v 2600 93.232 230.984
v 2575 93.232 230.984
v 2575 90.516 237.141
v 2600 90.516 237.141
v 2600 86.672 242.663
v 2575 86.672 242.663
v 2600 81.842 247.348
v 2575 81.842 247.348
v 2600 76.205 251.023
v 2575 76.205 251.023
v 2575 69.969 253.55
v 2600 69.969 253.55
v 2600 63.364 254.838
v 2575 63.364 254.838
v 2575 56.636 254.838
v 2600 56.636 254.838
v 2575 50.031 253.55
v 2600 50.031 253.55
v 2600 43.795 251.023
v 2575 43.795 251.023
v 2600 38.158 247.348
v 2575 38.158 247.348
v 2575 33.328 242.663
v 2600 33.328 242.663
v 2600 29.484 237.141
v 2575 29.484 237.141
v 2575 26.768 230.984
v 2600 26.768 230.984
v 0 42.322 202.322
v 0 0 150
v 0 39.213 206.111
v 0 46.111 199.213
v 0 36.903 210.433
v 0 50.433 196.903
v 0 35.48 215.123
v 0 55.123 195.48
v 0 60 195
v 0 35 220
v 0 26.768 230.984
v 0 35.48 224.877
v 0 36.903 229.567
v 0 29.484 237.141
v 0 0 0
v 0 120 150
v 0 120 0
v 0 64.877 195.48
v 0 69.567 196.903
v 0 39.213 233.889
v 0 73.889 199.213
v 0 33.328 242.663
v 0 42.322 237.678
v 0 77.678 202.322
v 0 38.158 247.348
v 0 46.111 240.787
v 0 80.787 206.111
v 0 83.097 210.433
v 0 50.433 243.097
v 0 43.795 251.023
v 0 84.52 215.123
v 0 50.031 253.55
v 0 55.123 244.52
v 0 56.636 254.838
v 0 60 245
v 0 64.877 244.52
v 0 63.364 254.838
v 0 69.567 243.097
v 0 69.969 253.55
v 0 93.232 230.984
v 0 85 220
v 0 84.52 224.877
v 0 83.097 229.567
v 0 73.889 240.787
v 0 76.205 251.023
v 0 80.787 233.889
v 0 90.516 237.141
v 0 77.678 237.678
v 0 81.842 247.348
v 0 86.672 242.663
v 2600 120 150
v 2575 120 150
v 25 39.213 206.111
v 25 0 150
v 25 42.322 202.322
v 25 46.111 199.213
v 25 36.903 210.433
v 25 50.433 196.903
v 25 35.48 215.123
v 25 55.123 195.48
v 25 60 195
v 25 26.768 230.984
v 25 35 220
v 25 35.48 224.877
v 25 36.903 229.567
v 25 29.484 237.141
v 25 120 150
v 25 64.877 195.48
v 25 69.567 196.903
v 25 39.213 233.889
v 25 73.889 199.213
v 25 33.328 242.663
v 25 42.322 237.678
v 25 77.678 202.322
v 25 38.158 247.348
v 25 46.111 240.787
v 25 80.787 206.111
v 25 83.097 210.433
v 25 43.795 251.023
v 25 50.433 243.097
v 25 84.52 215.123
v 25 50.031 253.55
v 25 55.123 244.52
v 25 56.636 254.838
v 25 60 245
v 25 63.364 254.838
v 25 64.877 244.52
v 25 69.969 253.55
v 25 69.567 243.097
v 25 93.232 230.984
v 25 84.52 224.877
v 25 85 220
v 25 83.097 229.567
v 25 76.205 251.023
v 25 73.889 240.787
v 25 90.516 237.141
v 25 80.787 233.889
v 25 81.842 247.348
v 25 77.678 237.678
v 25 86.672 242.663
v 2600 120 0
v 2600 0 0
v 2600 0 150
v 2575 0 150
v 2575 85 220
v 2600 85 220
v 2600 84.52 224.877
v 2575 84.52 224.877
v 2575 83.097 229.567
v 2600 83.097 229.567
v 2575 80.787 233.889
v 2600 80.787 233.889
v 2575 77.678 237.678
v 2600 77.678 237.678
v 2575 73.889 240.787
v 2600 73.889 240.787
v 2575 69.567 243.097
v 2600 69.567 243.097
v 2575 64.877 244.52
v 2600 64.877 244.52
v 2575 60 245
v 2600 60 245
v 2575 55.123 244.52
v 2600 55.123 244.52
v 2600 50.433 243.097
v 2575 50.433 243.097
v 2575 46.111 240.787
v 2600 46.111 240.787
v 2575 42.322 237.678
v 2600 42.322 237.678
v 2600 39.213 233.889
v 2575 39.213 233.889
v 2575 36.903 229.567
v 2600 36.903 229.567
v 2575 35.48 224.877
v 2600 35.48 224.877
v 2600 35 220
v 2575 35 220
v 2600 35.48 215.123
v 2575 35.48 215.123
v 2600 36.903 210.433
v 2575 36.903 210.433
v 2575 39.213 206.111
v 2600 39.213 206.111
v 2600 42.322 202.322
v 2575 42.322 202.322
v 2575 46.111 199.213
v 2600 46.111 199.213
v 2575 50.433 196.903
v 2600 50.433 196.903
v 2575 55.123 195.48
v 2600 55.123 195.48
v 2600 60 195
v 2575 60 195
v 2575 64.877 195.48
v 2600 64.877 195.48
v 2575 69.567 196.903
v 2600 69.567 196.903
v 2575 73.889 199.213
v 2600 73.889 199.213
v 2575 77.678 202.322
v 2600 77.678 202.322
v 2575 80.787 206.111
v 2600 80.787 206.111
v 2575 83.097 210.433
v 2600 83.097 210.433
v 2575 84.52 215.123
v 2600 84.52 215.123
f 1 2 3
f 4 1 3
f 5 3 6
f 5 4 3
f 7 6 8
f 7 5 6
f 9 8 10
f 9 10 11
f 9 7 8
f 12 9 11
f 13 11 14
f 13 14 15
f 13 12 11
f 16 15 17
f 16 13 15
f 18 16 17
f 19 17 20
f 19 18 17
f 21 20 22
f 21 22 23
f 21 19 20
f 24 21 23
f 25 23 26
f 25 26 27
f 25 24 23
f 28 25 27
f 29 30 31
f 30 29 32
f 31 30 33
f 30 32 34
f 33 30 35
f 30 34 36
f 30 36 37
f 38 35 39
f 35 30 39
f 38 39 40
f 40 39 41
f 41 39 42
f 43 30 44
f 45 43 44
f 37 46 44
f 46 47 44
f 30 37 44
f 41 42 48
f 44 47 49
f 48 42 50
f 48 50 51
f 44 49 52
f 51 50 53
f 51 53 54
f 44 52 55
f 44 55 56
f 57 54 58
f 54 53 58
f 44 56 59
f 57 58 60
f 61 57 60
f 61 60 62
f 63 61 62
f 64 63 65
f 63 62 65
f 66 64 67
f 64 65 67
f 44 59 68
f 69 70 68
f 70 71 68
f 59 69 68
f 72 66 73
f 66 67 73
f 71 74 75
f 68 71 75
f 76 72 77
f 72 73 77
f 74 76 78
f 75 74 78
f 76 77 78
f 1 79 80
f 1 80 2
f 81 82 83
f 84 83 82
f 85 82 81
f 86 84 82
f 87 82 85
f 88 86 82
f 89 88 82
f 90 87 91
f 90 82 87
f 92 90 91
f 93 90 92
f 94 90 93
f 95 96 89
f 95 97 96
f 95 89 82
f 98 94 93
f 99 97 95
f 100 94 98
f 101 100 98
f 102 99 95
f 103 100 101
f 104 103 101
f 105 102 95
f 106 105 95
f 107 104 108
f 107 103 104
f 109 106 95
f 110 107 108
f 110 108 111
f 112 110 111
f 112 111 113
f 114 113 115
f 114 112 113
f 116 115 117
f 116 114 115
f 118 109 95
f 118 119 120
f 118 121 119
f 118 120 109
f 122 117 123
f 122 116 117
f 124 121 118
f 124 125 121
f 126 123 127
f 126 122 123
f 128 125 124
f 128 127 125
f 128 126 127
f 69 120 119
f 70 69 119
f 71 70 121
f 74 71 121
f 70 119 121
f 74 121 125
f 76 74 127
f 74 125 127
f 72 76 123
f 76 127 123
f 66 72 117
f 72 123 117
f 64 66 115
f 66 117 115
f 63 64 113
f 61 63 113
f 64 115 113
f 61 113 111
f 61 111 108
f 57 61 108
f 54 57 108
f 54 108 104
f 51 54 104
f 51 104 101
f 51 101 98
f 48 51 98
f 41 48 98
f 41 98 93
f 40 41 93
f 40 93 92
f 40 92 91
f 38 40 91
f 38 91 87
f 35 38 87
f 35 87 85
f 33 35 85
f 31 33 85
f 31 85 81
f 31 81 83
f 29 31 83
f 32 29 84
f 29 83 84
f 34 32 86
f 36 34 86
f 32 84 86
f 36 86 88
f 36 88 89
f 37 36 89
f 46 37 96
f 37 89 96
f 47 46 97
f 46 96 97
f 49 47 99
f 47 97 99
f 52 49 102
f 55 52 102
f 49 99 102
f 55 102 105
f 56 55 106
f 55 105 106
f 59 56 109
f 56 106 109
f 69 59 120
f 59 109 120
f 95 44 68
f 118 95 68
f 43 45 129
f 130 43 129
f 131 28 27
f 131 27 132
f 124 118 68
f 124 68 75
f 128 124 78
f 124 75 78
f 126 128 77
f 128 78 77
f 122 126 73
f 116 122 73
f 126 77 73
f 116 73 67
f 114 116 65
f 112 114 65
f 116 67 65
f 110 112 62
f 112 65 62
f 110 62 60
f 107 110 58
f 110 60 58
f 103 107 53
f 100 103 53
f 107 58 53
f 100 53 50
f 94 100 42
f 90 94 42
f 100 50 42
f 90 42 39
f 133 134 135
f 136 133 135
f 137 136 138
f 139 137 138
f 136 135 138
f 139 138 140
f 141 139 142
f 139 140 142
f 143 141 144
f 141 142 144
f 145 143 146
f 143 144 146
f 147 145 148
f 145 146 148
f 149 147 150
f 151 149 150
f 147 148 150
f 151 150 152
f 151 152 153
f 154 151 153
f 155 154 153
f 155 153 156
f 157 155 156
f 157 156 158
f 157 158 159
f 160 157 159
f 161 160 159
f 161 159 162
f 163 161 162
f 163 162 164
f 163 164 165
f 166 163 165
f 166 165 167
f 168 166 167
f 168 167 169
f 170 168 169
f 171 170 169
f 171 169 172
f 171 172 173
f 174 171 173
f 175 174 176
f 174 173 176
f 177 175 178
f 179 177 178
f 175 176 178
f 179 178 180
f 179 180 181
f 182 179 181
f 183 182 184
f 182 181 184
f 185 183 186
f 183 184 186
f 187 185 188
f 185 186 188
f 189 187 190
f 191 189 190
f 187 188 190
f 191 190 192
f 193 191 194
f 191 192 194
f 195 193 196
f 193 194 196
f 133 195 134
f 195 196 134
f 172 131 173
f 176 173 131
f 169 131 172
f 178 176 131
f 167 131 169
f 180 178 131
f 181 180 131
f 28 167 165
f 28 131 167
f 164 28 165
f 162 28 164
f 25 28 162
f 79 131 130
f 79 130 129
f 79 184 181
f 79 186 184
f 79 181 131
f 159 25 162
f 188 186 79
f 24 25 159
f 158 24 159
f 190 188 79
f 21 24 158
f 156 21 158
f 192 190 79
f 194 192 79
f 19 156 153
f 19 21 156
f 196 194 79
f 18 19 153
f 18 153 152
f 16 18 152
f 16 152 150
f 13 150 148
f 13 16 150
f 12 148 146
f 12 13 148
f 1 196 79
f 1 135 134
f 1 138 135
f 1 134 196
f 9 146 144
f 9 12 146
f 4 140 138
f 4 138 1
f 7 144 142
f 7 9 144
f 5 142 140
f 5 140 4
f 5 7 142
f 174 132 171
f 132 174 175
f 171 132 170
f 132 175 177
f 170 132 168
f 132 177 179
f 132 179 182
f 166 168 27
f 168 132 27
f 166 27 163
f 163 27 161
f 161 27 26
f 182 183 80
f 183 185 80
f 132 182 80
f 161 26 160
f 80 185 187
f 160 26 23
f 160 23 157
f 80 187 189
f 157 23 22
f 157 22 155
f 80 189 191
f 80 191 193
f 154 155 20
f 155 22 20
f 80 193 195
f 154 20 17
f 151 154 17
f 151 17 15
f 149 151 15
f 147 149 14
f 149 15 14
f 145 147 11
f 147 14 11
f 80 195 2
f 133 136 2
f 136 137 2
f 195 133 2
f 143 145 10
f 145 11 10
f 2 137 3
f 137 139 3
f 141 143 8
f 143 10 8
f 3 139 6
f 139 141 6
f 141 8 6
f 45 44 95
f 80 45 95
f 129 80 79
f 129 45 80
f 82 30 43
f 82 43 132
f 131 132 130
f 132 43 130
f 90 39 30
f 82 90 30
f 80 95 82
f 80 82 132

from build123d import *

# Parameters (mm, degrees)
F0_W     = 2600
F0_H     = 120
F1_DEPTH = 150
F3_DEPTH = 25
F5_DEPTH = 25
F7_R     = 25
F8_DEPTH = 3000


with BuildPart() as f1:
    # F0 (on Top) → F1 (new body)
    with BuildSketch(Plane.XY):
        with Locations((1300, 60)):
            Rectangle(F0_W, F0_H)
    extrude(amount=F1_DEPTH)

    # F2 (on Right) → F3 (join)
    with BuildSketch(Plane.YZ):
        with BuildLine():
            Line((26.7683122543, 230.984303782), (0, 150))
            Line((0, 150), (120, 150))
            Line((120, 150), (93.2316877457, 230.984303782))
            ThreePointArc((93.2316877457, 230.984303782), (60, 255), (26.7683122543, 230.984303782))
        make_face()
    extrude(amount=F3_DEPTH)


with BuildPart() as f5:
    # F4 (on face) → F5 (new body)
    with BuildSketch(Plane.YZ.offset(2600)):
        with BuildLine():
            Line((26.7683122543, 230.984303782), (0, 150))
            Line((0, 150), (120, 150))
            Line((120, 150), (93.2316877457, 230.984303782))
            ThreePointArc((93.2316877457, 230.984303782), (60, 255), (26.7683122543, 230.984303782))
        make_face()
    extrude(amount=-F5_DEPTH)


with BuildPart() as f1_1:
    add(f1.part)

    # F6: union F5
    add(f5.part)

    # F7 (on face) → F8 (cut)
    with BuildSketch(Plane.YZ.offset(2600)):
        with Locations((60, 220)):
            Circle(F7_R)
    extrude(amount=-F8_DEPTH, mode=Mode.SUBTRACT)


solid = f1_1.part
